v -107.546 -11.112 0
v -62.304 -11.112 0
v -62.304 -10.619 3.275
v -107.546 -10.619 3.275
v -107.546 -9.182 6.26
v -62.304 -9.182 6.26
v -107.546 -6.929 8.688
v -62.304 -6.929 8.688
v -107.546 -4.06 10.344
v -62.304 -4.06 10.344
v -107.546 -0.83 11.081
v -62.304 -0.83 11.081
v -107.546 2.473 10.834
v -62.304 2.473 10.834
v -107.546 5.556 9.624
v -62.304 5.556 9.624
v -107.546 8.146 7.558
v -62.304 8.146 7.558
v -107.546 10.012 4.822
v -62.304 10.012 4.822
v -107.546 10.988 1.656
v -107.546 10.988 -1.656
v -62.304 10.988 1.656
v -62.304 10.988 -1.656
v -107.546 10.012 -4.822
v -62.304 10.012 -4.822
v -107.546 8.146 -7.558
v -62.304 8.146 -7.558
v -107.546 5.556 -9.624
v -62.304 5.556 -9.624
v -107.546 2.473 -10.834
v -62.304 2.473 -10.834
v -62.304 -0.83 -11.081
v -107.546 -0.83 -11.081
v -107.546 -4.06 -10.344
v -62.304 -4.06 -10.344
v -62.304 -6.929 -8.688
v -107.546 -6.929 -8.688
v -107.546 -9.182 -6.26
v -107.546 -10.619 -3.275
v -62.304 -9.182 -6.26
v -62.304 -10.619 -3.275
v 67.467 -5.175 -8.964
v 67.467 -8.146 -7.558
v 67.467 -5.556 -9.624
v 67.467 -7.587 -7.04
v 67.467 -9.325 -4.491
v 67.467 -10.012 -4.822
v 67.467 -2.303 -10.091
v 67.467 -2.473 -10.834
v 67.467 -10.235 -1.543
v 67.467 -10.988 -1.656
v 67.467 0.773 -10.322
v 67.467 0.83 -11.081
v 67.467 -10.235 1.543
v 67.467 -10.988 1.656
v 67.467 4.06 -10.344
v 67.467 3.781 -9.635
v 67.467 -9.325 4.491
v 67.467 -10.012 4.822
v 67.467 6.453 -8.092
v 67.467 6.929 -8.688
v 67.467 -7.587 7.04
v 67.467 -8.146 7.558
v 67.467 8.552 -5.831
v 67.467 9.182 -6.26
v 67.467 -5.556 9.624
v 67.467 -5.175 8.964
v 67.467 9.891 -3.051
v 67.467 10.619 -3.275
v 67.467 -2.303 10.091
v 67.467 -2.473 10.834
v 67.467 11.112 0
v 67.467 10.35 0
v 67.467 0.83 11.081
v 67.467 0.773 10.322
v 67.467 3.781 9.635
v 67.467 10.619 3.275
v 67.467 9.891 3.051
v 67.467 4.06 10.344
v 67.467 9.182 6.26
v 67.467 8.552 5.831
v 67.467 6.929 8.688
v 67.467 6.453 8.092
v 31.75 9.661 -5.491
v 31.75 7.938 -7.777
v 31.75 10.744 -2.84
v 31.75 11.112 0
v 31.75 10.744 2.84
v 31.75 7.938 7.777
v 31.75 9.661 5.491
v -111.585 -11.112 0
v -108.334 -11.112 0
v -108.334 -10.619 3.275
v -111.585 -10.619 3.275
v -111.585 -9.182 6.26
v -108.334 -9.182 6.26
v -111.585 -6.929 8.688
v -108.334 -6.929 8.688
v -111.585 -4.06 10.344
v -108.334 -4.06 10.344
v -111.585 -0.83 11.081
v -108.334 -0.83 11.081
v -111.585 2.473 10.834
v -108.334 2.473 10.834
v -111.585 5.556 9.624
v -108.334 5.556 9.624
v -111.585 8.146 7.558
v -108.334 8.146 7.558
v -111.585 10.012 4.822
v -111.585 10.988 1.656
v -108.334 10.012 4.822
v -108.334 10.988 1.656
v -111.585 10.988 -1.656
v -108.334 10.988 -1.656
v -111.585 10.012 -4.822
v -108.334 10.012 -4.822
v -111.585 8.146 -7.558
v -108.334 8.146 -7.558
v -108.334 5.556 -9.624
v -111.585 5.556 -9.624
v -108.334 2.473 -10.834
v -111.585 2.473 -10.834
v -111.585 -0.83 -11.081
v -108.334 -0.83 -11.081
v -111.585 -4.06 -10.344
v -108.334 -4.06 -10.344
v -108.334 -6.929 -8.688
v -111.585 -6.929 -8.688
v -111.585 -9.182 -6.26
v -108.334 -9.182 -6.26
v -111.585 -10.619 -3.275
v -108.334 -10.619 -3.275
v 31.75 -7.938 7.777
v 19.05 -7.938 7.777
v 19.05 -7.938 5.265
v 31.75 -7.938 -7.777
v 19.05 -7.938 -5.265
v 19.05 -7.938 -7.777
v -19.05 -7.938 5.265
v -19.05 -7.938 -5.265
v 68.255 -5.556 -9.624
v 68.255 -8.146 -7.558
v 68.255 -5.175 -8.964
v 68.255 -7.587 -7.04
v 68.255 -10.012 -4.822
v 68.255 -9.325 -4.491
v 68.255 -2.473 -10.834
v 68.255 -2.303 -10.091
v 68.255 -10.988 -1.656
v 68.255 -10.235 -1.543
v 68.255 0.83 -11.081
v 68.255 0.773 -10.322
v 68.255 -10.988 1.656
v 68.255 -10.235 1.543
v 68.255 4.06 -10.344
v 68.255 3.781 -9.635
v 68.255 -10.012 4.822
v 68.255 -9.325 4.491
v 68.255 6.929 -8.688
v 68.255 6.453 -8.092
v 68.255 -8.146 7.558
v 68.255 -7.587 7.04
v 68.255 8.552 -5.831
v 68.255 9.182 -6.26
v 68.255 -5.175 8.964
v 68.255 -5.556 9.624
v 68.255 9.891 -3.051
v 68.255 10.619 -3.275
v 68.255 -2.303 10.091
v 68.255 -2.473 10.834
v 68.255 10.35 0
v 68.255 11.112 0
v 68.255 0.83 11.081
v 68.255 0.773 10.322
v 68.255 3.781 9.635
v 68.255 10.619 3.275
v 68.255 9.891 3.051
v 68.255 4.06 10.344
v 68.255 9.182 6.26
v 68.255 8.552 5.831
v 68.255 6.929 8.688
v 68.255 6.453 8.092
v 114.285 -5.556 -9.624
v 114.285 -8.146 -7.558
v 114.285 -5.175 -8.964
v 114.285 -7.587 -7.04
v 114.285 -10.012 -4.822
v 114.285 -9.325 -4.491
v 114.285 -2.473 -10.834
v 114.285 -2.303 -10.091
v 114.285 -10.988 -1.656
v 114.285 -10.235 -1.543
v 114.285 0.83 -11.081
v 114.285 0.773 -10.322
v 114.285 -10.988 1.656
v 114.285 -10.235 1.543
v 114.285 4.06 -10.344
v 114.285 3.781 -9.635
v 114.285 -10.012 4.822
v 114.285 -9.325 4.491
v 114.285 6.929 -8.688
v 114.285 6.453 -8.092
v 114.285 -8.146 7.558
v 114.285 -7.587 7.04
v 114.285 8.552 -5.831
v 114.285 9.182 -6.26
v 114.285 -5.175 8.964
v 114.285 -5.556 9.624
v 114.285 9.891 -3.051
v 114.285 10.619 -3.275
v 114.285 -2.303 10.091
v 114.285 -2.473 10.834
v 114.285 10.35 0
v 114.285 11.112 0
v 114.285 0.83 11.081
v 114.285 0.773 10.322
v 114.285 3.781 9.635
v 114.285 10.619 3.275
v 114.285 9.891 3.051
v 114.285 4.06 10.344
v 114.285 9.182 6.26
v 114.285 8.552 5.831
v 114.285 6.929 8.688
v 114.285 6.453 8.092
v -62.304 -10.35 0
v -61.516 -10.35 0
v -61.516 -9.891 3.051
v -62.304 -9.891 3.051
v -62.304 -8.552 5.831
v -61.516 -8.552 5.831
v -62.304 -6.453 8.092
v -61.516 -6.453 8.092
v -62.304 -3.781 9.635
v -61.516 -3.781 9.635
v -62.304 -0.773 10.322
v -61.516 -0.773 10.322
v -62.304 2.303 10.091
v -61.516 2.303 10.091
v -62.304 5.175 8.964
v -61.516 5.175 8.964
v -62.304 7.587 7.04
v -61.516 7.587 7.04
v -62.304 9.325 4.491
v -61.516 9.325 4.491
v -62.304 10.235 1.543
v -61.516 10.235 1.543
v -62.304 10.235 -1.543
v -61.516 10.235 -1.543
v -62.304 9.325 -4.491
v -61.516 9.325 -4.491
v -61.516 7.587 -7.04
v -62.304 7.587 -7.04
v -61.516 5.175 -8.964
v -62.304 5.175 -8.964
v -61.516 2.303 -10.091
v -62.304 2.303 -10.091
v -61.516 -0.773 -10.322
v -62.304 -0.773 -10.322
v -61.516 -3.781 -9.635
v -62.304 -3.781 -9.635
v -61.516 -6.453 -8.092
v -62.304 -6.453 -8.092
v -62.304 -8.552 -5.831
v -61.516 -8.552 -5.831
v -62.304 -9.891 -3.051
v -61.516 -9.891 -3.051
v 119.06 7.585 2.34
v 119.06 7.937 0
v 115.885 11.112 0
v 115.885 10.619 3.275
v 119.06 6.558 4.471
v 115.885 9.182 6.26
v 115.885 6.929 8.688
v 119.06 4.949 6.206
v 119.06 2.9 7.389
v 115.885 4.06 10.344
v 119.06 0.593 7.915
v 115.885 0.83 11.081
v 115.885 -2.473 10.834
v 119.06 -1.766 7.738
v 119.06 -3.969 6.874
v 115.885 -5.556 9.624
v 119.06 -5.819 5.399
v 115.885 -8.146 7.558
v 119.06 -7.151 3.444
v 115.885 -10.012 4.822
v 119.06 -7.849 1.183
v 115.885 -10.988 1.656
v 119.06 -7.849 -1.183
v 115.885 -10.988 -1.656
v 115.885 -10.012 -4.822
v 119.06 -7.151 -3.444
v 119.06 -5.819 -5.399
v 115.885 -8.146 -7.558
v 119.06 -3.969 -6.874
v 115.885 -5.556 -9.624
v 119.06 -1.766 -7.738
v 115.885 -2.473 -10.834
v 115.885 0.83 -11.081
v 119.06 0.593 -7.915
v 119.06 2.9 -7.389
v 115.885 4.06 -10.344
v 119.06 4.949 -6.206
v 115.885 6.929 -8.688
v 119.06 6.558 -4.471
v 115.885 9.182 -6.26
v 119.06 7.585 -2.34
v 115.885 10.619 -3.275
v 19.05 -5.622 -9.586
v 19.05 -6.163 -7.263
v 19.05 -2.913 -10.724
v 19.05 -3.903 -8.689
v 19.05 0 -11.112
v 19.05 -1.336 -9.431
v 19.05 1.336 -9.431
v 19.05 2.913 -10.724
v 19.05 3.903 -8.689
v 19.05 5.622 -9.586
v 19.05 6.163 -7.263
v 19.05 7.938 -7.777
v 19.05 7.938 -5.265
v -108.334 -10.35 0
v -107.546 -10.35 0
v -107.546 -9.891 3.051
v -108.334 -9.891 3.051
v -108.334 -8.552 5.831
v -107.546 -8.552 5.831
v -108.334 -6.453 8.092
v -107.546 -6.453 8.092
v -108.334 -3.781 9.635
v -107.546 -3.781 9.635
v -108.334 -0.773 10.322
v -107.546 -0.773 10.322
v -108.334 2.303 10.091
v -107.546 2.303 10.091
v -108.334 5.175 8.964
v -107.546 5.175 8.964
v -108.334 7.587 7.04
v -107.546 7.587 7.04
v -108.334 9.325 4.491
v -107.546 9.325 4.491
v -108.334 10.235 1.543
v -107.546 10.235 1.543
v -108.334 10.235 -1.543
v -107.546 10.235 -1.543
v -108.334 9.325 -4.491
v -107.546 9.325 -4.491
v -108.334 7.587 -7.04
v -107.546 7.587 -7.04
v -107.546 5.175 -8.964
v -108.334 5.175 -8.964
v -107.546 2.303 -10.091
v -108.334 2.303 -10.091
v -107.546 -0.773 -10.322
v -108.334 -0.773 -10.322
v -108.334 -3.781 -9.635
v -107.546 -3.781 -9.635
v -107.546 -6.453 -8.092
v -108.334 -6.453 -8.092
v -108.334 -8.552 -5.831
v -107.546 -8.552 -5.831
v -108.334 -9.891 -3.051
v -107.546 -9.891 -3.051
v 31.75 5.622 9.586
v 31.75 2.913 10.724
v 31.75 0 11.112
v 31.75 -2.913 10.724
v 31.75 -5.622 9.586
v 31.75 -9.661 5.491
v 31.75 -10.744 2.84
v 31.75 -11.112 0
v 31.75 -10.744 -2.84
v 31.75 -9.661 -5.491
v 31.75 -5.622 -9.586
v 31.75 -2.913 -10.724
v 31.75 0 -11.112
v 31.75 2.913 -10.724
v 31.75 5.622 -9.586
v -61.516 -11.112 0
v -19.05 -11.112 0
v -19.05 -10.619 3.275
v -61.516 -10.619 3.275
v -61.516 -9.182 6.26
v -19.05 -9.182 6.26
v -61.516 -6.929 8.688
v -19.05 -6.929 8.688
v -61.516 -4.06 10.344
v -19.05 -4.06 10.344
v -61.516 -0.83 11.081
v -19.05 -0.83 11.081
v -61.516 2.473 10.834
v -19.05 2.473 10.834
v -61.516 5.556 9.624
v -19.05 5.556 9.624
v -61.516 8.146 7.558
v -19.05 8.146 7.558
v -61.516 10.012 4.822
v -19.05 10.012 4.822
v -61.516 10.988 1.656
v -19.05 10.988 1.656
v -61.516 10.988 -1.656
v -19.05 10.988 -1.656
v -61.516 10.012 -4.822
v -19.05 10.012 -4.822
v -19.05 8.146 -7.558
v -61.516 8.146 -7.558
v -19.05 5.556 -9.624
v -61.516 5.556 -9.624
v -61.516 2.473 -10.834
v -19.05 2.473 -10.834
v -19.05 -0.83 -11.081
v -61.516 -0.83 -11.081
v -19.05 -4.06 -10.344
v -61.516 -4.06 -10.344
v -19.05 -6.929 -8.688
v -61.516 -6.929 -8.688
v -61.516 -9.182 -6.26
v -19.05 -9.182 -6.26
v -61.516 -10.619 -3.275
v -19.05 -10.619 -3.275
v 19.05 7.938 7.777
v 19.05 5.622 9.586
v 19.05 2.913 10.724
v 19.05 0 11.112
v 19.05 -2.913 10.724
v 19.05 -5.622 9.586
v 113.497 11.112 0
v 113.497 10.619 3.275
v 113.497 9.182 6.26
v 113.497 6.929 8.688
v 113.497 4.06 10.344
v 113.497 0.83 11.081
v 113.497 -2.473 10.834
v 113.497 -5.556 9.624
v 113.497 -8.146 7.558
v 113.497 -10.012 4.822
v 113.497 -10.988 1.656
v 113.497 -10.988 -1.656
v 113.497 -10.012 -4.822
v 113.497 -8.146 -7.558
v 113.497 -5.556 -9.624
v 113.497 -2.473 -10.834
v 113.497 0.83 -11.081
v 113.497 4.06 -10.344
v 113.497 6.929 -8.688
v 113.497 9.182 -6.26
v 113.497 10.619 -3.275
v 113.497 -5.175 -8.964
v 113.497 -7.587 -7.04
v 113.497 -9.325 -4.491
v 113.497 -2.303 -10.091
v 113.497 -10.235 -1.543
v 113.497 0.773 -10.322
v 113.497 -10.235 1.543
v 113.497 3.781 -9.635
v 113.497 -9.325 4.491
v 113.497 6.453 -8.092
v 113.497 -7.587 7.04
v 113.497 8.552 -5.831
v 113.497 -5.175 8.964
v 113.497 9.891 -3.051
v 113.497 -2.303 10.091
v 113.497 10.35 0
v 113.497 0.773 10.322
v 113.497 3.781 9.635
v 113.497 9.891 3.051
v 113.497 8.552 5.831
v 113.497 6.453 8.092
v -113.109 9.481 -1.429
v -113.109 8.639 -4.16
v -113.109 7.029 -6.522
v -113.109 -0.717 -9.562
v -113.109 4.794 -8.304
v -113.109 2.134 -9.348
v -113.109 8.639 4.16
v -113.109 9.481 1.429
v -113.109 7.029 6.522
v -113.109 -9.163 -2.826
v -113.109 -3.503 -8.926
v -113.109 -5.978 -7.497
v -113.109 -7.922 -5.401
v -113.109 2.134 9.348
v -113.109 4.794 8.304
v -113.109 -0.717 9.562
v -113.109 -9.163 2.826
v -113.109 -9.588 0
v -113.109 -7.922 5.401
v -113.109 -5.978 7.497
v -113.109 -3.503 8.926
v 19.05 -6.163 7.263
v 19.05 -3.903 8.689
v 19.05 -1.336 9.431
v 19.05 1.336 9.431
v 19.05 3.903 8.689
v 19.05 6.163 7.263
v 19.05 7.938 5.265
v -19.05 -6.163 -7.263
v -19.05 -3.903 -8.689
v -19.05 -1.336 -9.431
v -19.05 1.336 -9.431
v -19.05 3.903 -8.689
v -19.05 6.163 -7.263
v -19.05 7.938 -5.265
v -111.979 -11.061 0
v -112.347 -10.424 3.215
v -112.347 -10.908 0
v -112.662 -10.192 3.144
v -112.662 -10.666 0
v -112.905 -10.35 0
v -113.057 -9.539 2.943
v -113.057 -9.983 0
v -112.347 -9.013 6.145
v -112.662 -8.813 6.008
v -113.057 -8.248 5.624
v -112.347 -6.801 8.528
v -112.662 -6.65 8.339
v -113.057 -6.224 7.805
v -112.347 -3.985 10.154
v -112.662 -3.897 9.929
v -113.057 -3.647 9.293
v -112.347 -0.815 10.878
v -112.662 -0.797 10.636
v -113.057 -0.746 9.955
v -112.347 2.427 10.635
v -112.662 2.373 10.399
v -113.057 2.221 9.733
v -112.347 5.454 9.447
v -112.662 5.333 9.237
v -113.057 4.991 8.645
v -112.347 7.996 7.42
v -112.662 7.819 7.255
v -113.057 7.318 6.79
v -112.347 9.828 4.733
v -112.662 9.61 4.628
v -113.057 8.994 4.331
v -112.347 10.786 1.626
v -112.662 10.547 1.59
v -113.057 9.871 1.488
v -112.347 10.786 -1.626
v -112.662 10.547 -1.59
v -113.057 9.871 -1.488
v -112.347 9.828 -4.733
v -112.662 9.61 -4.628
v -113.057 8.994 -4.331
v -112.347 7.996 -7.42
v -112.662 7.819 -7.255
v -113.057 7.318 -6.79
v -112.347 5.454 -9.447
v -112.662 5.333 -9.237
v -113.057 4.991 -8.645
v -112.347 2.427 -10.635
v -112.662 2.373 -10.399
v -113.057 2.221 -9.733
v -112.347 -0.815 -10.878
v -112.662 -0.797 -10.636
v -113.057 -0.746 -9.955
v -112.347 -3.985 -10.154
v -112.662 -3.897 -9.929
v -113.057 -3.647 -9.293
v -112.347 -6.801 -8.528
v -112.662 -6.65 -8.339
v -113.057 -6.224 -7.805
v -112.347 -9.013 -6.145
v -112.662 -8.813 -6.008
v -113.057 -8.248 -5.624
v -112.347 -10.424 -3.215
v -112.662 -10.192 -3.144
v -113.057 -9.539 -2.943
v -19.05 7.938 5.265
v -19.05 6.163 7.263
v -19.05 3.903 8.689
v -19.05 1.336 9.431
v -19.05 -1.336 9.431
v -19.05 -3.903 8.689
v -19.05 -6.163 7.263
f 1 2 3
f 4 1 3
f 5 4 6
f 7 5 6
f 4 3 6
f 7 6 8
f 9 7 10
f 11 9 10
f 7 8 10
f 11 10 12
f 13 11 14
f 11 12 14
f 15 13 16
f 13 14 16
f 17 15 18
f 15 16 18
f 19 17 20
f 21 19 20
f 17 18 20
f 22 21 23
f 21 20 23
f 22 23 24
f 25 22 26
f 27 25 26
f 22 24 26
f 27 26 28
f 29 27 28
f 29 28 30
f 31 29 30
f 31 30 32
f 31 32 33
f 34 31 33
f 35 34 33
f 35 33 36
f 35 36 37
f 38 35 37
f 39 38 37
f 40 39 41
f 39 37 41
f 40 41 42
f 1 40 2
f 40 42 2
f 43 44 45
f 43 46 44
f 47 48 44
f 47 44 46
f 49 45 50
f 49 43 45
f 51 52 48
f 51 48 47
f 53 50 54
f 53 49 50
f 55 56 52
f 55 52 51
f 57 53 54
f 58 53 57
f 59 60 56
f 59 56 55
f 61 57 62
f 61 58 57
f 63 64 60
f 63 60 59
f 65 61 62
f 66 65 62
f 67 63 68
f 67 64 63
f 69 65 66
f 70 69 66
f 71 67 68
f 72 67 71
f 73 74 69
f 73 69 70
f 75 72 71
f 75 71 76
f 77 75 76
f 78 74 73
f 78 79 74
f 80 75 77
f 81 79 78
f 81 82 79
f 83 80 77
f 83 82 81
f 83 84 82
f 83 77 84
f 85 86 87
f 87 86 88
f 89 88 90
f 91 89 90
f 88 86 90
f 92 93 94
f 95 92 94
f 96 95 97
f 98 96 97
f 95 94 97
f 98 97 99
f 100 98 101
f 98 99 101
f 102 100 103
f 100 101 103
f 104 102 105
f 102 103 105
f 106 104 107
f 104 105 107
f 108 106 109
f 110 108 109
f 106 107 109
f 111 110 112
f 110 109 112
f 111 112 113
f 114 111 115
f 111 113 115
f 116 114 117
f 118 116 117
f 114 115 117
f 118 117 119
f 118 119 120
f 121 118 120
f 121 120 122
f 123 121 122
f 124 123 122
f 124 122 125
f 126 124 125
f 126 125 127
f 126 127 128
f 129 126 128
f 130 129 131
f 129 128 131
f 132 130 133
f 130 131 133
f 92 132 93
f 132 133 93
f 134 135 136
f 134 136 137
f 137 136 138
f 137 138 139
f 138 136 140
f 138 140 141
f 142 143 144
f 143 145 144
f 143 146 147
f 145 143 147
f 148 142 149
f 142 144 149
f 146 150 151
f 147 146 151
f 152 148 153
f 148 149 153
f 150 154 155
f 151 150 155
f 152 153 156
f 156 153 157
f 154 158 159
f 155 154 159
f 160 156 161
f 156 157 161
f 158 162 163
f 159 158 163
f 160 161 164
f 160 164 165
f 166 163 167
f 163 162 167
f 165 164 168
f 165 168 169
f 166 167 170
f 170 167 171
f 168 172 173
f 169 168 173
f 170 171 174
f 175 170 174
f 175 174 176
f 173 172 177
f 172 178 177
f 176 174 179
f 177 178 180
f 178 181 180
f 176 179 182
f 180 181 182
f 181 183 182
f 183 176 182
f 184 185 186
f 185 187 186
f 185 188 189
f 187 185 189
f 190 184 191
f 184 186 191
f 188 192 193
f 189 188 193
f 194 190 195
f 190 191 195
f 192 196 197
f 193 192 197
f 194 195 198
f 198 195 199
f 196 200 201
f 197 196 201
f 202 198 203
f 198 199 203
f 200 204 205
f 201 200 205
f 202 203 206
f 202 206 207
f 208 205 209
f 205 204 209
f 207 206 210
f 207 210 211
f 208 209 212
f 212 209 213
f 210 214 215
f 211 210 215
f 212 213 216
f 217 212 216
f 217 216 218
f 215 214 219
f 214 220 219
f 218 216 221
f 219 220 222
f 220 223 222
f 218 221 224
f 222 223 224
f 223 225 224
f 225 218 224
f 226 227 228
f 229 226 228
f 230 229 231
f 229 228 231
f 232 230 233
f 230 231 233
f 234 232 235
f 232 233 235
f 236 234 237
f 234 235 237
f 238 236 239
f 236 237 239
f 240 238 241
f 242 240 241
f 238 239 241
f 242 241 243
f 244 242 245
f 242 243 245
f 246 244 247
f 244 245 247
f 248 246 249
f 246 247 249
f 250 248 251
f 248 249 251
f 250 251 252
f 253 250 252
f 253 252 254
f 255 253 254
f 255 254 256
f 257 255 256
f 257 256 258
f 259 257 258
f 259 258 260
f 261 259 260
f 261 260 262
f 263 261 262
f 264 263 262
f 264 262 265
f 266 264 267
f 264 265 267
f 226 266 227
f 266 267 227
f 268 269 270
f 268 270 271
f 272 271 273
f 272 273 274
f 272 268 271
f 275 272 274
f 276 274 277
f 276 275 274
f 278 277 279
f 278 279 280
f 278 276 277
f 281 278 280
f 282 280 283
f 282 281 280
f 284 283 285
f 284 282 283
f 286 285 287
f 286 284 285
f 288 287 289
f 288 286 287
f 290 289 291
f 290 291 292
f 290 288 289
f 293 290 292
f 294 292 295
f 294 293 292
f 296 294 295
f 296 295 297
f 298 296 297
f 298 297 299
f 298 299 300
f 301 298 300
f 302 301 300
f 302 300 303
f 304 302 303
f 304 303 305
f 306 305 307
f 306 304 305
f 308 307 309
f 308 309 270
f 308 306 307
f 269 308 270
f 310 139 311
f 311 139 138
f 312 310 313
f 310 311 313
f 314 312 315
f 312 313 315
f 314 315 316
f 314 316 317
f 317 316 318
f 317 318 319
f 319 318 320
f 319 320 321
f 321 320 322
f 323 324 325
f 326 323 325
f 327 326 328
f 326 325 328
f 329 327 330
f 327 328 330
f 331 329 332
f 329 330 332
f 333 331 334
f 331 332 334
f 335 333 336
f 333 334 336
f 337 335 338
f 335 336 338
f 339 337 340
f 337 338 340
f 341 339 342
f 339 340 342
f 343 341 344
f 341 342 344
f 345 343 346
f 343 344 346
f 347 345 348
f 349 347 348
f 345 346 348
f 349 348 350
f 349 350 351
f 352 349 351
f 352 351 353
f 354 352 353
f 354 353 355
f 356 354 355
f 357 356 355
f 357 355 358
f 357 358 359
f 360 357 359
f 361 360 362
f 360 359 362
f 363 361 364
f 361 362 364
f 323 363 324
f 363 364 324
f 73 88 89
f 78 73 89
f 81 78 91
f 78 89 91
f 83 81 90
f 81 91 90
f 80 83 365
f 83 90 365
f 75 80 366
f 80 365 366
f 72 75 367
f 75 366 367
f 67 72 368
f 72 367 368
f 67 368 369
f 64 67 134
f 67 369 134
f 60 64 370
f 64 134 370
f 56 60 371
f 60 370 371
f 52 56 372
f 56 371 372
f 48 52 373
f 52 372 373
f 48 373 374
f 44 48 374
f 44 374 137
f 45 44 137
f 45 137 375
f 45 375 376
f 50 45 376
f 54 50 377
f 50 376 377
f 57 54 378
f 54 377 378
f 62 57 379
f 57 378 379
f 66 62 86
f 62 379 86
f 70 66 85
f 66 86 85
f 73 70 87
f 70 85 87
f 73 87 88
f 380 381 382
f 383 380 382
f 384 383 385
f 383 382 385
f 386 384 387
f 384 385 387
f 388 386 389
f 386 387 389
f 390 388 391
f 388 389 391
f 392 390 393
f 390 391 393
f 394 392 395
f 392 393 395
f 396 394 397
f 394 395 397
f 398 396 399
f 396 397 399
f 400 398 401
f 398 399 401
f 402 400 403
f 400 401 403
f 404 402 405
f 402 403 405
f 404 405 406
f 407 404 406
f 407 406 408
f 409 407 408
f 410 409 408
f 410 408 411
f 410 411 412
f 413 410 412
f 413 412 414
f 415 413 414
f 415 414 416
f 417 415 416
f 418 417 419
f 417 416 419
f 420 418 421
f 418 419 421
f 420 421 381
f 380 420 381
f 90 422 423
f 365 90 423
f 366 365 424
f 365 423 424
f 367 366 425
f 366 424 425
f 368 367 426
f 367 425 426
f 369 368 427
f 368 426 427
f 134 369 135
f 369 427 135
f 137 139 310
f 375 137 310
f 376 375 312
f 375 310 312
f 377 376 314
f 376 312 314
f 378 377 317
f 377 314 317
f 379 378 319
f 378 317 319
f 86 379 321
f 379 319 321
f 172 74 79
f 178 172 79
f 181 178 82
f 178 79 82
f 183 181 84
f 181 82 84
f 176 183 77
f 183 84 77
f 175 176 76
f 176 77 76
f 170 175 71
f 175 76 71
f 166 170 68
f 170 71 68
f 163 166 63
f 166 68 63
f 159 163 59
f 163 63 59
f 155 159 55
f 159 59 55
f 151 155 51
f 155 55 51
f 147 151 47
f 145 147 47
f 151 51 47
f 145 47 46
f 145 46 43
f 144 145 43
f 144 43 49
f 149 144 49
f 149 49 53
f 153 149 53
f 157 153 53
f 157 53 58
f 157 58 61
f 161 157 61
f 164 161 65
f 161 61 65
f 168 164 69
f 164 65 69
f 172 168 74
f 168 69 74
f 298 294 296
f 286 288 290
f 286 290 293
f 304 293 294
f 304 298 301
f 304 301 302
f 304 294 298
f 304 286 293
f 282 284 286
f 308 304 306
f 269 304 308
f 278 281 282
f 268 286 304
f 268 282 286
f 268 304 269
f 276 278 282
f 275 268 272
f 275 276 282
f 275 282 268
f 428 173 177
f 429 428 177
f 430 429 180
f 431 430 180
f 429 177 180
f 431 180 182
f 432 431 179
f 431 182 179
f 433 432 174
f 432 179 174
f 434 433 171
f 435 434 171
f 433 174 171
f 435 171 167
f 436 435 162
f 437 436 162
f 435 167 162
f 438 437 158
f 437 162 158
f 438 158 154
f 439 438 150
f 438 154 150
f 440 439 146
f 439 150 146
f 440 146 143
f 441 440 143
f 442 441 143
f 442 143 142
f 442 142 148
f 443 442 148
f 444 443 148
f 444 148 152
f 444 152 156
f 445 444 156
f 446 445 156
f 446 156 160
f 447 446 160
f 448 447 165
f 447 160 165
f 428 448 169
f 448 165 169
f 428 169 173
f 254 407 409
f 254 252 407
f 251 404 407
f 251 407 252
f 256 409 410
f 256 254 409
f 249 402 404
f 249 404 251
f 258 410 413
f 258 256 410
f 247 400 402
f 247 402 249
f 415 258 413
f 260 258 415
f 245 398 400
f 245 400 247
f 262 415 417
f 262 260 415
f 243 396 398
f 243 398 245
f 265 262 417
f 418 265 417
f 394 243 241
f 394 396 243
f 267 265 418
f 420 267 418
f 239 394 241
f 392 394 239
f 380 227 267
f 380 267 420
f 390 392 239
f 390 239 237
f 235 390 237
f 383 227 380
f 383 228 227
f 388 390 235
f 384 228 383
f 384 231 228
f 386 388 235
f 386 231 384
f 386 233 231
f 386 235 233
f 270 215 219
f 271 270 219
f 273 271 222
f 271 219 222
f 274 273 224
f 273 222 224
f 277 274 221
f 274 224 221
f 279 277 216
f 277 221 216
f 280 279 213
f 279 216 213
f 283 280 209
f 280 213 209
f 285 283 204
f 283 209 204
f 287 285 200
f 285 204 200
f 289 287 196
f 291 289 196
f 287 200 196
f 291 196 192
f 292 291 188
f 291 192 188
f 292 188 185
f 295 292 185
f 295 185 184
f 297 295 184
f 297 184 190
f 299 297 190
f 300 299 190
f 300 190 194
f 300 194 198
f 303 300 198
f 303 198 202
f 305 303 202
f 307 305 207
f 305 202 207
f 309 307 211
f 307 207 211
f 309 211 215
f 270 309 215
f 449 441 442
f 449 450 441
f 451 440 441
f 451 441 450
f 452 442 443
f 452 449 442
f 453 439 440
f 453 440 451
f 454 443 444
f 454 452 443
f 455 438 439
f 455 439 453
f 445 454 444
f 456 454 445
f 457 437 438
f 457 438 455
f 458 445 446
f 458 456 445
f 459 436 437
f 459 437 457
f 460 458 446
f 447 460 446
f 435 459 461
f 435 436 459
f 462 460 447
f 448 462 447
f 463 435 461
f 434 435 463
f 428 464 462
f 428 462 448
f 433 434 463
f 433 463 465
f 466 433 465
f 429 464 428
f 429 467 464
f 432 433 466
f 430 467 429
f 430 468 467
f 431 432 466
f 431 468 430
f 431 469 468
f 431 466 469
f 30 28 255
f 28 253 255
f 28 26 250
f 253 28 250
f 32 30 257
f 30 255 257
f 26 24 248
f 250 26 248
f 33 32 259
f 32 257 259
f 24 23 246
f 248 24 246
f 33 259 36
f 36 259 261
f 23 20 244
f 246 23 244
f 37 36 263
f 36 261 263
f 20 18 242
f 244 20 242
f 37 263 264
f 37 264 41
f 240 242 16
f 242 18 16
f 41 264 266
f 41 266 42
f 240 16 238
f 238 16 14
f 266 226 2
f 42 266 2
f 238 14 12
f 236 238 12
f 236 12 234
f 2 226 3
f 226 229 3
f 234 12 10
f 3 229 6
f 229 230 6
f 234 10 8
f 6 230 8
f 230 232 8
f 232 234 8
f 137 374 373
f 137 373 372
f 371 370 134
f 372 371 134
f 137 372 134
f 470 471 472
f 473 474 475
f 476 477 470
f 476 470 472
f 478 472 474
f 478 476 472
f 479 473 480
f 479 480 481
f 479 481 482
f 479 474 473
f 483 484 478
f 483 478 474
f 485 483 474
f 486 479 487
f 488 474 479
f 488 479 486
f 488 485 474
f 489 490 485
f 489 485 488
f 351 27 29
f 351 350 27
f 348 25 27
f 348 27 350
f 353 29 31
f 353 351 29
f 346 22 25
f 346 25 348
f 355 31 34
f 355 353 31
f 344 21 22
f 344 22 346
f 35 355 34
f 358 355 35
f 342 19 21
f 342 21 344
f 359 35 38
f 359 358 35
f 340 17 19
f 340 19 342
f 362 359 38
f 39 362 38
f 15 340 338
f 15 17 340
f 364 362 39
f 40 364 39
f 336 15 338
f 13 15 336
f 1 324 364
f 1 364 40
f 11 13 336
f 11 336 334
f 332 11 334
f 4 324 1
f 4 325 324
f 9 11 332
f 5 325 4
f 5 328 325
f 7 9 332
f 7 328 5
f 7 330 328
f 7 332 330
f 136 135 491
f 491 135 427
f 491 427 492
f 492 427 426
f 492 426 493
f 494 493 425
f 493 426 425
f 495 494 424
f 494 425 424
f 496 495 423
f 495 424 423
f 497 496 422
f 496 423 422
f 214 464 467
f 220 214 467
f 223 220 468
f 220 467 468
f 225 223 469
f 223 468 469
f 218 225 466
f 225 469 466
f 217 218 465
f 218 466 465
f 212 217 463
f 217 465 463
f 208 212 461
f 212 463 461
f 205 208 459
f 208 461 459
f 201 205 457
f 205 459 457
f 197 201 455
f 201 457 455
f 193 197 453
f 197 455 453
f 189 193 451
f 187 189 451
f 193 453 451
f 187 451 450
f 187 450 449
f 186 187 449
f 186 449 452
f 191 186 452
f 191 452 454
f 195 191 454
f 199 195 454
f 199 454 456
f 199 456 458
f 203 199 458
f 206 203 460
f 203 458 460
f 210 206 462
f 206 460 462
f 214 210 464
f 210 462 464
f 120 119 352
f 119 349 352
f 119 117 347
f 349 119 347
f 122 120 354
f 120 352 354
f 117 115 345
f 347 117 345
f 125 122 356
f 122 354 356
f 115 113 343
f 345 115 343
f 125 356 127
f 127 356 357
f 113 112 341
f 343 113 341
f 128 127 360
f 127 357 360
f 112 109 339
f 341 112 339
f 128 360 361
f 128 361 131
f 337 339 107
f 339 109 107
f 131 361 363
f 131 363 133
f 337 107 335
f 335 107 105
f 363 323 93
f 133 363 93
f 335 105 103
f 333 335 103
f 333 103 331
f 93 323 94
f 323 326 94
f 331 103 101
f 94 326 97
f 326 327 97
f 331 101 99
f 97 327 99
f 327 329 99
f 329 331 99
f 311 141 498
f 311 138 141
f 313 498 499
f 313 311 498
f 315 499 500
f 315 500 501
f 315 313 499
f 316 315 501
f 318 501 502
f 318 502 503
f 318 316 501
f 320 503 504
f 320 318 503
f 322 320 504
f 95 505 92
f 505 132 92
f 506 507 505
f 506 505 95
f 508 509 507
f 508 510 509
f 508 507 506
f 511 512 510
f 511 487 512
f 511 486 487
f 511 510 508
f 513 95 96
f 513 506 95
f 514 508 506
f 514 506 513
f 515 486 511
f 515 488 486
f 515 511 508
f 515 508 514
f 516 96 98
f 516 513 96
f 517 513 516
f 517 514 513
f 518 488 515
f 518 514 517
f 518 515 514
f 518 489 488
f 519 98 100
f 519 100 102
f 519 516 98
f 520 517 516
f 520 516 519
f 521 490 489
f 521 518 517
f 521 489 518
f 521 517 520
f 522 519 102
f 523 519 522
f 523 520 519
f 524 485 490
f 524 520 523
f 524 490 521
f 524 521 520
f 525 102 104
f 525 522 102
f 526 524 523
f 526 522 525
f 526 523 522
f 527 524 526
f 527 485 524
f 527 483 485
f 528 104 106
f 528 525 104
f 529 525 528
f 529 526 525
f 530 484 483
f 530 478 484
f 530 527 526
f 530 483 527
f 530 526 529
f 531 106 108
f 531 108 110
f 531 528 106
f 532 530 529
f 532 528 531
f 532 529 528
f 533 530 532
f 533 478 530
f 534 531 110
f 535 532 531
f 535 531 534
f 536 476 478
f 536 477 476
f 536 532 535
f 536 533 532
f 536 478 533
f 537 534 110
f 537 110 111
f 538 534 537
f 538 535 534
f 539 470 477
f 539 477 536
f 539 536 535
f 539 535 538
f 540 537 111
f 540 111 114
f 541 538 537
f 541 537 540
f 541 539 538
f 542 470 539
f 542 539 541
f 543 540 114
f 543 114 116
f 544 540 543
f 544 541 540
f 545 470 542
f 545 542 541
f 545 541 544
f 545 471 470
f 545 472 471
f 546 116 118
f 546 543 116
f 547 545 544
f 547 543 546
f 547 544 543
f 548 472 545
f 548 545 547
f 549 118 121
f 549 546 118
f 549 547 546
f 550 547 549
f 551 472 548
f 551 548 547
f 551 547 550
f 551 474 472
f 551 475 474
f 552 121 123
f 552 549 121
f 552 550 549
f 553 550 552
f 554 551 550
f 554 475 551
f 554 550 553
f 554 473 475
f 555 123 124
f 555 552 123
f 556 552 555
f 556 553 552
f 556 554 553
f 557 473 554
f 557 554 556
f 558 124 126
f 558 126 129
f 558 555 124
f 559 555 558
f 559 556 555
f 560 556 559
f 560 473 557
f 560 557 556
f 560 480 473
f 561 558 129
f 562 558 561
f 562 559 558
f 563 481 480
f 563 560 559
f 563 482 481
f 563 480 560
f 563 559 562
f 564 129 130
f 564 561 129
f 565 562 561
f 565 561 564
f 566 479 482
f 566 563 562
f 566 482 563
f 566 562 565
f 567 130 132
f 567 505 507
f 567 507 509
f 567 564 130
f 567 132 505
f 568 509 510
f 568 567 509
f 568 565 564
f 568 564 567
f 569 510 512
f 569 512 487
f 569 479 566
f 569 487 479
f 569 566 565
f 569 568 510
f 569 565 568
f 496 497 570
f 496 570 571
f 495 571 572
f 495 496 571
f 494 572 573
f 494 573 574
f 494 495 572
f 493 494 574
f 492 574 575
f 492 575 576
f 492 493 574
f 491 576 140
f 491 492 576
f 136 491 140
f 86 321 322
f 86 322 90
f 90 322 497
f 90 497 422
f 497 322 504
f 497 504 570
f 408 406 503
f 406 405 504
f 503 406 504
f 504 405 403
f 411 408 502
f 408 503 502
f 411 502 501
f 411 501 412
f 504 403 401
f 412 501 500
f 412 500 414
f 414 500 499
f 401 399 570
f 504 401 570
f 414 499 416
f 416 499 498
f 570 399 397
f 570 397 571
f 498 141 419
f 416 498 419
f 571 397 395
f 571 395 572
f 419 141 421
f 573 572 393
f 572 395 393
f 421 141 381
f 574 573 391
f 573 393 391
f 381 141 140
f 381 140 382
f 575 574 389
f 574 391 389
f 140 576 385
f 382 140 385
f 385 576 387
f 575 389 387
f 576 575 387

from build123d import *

# Parameters (mm, degrees)
F1_DEPTH  = 19.05
F3_DEPTH  = 12.7
F4_R      = 11.1125
F5_DEPTH  = 35.71748
F6_R      = 11.1125
F7_DEPTH  = 42.46626
F8_R      = 10.3505
F9_DEPTH  = 0.7874
F10_R     = 10.3505
F11_DEPTH = 0.7874
F12_R     = 11.1125
F13_DEPTH = 45.24248
F14_R     = 10.3505
F15_DEPTH = 0.7874
F16_R     = 11.1125
F17_DEPTH = 4.7752
F18_R     = 1.524
F19_R     = 11.1125
F20_DEPTH = 45.24248
F21_R     = 10.3505
F22_DEPTH = 0.7874
F23_R     = 11.1125
F24_DEPTH = 4.7752
F25_SIZE  = 3.175


with BuildPart() as f1:
    # F0 (on Right) → F1 (new body, symmetric)
    with BuildSketch(Plane.YZ):
        with BuildLine():
            Line((7.9375, -5.2651418547), (7.9375, 5.2651418547))
            ThreePointArc((7.9375, 5.2651418547), (0, 9.525), (-7.9375, 5.2651418547))
            Line((-7.9375, 5.2651418547), (-7.9375, -5.2651418547))
            ThreePointArc((-7.9375, -5.2651418547), (0, -9.525), (7.9375, -5.2651418547))
        make_face()
    extrude(amount=F1_DEPTH, both=True)

    # F2 (on face) → F3 (join)
    with BuildSketch(Plane.YZ.offset(19.05)):
        with BuildLine():
            Line((-7.9375, 7.7771299333), (-7.9375, -7.7771299333))
            ThreePointArc((-7.9375, -7.7771299333), (0, -11.1125), (7.9375, -7.7771299333))
            Line((7.9375, -7.7771299333), (7.9375, 7.7771299333))
            ThreePointArc((7.9375, 7.7771299333), (0, 11.1125), (-7.9375, 7.7771299333))
        make_face()
    extrude(amount=F3_DEPTH)

    # F4 (on face) → F5 (join)
    with BuildSketch(Plane.YZ.offset(31.75)):
        Circle(F4_R)
    extrude(amount=F5_DEPTH)

    # F6 (on face) → F7 (join)
    with BuildSketch(Plane(origin=(-19.05, 0, 0), x_dir=(0, -1, 0), z_dir=(-1, 0, 0))):
        Circle(F6_R)
    extrude(amount=F7_DEPTH)

    # F8 (on face) → F9 (join)
    with BuildSketch(Plane.YZ.offset(67.46748)):
        Circle(F8_R)
    extrude(amount=F9_DEPTH)

    # F10 (on face) → F11 (join)
    with BuildSketch(Plane(origin=(-61.51626, 0, 0), x_dir=(0, -1, 0), z_dir=(-1, 0, 0))):
        Circle(F10_R)
    extrude(amount=F11_DEPTH)

    # F12 (on face) → F13 (join)
    with BuildSketch(Plane(origin=(-62.30366, 0, 0), x_dir=(0, -1, 0), z_dir=(-1, 0, 0))):
        Circle(F12_R)
    extrude(amount=F13_DEPTH)

    # F14 (on face) → F15 (join)
    with BuildSketch(Plane(origin=(-107.54614, 0, 0), x_dir=(0, -1, 0), z_dir=(-1, 0, 0))):
        Circle(F14_R)
    extrude(amount=F15_DEPTH)

    # F16 (on face) → F17 (join)
    with BuildSketch(Plane(origin=(-108.33354, 0, 0), x_dir=(0, -1, 0), z_dir=(-1, 0, 0))):
        Circle(F16_R)
    extrude(amount=F17_DEPTH)

    # F18
    f18_edges = [f1.edges().sort_by_distance(p)[0] for p in [
        (-113.10874, 11.1125, 0),
    ]]
    fillet(f18_edges, radius=F18_R)

    # F19 (on face) → F20 (join)
    with BuildSketch(Plane.YZ.offset(68.25488)):
        Circle(F19_R)
    extrude(amount=F20_DEPTH)

    # F21 (on face) → F22 (join)
    with BuildSketch(Plane.YZ.offset(113.49736)):
        Circle(F21_R)
    extrude(amount=F22_DEPTH)

    # F23 (on face) → F24 (join)
    with BuildSketch(Plane.YZ.offset(114.28476)):
        Circle(F23_R)
    extrude(amount=F24_DEPTH)

    # F25
    f25_edges = [f1.edges().sort_by_distance(p)[0] for p in [
        (119.05996, -11.1125, 0),
    ]]
    chamfer(f25_edges, length=F25_SIZE)


solid = f1.part
